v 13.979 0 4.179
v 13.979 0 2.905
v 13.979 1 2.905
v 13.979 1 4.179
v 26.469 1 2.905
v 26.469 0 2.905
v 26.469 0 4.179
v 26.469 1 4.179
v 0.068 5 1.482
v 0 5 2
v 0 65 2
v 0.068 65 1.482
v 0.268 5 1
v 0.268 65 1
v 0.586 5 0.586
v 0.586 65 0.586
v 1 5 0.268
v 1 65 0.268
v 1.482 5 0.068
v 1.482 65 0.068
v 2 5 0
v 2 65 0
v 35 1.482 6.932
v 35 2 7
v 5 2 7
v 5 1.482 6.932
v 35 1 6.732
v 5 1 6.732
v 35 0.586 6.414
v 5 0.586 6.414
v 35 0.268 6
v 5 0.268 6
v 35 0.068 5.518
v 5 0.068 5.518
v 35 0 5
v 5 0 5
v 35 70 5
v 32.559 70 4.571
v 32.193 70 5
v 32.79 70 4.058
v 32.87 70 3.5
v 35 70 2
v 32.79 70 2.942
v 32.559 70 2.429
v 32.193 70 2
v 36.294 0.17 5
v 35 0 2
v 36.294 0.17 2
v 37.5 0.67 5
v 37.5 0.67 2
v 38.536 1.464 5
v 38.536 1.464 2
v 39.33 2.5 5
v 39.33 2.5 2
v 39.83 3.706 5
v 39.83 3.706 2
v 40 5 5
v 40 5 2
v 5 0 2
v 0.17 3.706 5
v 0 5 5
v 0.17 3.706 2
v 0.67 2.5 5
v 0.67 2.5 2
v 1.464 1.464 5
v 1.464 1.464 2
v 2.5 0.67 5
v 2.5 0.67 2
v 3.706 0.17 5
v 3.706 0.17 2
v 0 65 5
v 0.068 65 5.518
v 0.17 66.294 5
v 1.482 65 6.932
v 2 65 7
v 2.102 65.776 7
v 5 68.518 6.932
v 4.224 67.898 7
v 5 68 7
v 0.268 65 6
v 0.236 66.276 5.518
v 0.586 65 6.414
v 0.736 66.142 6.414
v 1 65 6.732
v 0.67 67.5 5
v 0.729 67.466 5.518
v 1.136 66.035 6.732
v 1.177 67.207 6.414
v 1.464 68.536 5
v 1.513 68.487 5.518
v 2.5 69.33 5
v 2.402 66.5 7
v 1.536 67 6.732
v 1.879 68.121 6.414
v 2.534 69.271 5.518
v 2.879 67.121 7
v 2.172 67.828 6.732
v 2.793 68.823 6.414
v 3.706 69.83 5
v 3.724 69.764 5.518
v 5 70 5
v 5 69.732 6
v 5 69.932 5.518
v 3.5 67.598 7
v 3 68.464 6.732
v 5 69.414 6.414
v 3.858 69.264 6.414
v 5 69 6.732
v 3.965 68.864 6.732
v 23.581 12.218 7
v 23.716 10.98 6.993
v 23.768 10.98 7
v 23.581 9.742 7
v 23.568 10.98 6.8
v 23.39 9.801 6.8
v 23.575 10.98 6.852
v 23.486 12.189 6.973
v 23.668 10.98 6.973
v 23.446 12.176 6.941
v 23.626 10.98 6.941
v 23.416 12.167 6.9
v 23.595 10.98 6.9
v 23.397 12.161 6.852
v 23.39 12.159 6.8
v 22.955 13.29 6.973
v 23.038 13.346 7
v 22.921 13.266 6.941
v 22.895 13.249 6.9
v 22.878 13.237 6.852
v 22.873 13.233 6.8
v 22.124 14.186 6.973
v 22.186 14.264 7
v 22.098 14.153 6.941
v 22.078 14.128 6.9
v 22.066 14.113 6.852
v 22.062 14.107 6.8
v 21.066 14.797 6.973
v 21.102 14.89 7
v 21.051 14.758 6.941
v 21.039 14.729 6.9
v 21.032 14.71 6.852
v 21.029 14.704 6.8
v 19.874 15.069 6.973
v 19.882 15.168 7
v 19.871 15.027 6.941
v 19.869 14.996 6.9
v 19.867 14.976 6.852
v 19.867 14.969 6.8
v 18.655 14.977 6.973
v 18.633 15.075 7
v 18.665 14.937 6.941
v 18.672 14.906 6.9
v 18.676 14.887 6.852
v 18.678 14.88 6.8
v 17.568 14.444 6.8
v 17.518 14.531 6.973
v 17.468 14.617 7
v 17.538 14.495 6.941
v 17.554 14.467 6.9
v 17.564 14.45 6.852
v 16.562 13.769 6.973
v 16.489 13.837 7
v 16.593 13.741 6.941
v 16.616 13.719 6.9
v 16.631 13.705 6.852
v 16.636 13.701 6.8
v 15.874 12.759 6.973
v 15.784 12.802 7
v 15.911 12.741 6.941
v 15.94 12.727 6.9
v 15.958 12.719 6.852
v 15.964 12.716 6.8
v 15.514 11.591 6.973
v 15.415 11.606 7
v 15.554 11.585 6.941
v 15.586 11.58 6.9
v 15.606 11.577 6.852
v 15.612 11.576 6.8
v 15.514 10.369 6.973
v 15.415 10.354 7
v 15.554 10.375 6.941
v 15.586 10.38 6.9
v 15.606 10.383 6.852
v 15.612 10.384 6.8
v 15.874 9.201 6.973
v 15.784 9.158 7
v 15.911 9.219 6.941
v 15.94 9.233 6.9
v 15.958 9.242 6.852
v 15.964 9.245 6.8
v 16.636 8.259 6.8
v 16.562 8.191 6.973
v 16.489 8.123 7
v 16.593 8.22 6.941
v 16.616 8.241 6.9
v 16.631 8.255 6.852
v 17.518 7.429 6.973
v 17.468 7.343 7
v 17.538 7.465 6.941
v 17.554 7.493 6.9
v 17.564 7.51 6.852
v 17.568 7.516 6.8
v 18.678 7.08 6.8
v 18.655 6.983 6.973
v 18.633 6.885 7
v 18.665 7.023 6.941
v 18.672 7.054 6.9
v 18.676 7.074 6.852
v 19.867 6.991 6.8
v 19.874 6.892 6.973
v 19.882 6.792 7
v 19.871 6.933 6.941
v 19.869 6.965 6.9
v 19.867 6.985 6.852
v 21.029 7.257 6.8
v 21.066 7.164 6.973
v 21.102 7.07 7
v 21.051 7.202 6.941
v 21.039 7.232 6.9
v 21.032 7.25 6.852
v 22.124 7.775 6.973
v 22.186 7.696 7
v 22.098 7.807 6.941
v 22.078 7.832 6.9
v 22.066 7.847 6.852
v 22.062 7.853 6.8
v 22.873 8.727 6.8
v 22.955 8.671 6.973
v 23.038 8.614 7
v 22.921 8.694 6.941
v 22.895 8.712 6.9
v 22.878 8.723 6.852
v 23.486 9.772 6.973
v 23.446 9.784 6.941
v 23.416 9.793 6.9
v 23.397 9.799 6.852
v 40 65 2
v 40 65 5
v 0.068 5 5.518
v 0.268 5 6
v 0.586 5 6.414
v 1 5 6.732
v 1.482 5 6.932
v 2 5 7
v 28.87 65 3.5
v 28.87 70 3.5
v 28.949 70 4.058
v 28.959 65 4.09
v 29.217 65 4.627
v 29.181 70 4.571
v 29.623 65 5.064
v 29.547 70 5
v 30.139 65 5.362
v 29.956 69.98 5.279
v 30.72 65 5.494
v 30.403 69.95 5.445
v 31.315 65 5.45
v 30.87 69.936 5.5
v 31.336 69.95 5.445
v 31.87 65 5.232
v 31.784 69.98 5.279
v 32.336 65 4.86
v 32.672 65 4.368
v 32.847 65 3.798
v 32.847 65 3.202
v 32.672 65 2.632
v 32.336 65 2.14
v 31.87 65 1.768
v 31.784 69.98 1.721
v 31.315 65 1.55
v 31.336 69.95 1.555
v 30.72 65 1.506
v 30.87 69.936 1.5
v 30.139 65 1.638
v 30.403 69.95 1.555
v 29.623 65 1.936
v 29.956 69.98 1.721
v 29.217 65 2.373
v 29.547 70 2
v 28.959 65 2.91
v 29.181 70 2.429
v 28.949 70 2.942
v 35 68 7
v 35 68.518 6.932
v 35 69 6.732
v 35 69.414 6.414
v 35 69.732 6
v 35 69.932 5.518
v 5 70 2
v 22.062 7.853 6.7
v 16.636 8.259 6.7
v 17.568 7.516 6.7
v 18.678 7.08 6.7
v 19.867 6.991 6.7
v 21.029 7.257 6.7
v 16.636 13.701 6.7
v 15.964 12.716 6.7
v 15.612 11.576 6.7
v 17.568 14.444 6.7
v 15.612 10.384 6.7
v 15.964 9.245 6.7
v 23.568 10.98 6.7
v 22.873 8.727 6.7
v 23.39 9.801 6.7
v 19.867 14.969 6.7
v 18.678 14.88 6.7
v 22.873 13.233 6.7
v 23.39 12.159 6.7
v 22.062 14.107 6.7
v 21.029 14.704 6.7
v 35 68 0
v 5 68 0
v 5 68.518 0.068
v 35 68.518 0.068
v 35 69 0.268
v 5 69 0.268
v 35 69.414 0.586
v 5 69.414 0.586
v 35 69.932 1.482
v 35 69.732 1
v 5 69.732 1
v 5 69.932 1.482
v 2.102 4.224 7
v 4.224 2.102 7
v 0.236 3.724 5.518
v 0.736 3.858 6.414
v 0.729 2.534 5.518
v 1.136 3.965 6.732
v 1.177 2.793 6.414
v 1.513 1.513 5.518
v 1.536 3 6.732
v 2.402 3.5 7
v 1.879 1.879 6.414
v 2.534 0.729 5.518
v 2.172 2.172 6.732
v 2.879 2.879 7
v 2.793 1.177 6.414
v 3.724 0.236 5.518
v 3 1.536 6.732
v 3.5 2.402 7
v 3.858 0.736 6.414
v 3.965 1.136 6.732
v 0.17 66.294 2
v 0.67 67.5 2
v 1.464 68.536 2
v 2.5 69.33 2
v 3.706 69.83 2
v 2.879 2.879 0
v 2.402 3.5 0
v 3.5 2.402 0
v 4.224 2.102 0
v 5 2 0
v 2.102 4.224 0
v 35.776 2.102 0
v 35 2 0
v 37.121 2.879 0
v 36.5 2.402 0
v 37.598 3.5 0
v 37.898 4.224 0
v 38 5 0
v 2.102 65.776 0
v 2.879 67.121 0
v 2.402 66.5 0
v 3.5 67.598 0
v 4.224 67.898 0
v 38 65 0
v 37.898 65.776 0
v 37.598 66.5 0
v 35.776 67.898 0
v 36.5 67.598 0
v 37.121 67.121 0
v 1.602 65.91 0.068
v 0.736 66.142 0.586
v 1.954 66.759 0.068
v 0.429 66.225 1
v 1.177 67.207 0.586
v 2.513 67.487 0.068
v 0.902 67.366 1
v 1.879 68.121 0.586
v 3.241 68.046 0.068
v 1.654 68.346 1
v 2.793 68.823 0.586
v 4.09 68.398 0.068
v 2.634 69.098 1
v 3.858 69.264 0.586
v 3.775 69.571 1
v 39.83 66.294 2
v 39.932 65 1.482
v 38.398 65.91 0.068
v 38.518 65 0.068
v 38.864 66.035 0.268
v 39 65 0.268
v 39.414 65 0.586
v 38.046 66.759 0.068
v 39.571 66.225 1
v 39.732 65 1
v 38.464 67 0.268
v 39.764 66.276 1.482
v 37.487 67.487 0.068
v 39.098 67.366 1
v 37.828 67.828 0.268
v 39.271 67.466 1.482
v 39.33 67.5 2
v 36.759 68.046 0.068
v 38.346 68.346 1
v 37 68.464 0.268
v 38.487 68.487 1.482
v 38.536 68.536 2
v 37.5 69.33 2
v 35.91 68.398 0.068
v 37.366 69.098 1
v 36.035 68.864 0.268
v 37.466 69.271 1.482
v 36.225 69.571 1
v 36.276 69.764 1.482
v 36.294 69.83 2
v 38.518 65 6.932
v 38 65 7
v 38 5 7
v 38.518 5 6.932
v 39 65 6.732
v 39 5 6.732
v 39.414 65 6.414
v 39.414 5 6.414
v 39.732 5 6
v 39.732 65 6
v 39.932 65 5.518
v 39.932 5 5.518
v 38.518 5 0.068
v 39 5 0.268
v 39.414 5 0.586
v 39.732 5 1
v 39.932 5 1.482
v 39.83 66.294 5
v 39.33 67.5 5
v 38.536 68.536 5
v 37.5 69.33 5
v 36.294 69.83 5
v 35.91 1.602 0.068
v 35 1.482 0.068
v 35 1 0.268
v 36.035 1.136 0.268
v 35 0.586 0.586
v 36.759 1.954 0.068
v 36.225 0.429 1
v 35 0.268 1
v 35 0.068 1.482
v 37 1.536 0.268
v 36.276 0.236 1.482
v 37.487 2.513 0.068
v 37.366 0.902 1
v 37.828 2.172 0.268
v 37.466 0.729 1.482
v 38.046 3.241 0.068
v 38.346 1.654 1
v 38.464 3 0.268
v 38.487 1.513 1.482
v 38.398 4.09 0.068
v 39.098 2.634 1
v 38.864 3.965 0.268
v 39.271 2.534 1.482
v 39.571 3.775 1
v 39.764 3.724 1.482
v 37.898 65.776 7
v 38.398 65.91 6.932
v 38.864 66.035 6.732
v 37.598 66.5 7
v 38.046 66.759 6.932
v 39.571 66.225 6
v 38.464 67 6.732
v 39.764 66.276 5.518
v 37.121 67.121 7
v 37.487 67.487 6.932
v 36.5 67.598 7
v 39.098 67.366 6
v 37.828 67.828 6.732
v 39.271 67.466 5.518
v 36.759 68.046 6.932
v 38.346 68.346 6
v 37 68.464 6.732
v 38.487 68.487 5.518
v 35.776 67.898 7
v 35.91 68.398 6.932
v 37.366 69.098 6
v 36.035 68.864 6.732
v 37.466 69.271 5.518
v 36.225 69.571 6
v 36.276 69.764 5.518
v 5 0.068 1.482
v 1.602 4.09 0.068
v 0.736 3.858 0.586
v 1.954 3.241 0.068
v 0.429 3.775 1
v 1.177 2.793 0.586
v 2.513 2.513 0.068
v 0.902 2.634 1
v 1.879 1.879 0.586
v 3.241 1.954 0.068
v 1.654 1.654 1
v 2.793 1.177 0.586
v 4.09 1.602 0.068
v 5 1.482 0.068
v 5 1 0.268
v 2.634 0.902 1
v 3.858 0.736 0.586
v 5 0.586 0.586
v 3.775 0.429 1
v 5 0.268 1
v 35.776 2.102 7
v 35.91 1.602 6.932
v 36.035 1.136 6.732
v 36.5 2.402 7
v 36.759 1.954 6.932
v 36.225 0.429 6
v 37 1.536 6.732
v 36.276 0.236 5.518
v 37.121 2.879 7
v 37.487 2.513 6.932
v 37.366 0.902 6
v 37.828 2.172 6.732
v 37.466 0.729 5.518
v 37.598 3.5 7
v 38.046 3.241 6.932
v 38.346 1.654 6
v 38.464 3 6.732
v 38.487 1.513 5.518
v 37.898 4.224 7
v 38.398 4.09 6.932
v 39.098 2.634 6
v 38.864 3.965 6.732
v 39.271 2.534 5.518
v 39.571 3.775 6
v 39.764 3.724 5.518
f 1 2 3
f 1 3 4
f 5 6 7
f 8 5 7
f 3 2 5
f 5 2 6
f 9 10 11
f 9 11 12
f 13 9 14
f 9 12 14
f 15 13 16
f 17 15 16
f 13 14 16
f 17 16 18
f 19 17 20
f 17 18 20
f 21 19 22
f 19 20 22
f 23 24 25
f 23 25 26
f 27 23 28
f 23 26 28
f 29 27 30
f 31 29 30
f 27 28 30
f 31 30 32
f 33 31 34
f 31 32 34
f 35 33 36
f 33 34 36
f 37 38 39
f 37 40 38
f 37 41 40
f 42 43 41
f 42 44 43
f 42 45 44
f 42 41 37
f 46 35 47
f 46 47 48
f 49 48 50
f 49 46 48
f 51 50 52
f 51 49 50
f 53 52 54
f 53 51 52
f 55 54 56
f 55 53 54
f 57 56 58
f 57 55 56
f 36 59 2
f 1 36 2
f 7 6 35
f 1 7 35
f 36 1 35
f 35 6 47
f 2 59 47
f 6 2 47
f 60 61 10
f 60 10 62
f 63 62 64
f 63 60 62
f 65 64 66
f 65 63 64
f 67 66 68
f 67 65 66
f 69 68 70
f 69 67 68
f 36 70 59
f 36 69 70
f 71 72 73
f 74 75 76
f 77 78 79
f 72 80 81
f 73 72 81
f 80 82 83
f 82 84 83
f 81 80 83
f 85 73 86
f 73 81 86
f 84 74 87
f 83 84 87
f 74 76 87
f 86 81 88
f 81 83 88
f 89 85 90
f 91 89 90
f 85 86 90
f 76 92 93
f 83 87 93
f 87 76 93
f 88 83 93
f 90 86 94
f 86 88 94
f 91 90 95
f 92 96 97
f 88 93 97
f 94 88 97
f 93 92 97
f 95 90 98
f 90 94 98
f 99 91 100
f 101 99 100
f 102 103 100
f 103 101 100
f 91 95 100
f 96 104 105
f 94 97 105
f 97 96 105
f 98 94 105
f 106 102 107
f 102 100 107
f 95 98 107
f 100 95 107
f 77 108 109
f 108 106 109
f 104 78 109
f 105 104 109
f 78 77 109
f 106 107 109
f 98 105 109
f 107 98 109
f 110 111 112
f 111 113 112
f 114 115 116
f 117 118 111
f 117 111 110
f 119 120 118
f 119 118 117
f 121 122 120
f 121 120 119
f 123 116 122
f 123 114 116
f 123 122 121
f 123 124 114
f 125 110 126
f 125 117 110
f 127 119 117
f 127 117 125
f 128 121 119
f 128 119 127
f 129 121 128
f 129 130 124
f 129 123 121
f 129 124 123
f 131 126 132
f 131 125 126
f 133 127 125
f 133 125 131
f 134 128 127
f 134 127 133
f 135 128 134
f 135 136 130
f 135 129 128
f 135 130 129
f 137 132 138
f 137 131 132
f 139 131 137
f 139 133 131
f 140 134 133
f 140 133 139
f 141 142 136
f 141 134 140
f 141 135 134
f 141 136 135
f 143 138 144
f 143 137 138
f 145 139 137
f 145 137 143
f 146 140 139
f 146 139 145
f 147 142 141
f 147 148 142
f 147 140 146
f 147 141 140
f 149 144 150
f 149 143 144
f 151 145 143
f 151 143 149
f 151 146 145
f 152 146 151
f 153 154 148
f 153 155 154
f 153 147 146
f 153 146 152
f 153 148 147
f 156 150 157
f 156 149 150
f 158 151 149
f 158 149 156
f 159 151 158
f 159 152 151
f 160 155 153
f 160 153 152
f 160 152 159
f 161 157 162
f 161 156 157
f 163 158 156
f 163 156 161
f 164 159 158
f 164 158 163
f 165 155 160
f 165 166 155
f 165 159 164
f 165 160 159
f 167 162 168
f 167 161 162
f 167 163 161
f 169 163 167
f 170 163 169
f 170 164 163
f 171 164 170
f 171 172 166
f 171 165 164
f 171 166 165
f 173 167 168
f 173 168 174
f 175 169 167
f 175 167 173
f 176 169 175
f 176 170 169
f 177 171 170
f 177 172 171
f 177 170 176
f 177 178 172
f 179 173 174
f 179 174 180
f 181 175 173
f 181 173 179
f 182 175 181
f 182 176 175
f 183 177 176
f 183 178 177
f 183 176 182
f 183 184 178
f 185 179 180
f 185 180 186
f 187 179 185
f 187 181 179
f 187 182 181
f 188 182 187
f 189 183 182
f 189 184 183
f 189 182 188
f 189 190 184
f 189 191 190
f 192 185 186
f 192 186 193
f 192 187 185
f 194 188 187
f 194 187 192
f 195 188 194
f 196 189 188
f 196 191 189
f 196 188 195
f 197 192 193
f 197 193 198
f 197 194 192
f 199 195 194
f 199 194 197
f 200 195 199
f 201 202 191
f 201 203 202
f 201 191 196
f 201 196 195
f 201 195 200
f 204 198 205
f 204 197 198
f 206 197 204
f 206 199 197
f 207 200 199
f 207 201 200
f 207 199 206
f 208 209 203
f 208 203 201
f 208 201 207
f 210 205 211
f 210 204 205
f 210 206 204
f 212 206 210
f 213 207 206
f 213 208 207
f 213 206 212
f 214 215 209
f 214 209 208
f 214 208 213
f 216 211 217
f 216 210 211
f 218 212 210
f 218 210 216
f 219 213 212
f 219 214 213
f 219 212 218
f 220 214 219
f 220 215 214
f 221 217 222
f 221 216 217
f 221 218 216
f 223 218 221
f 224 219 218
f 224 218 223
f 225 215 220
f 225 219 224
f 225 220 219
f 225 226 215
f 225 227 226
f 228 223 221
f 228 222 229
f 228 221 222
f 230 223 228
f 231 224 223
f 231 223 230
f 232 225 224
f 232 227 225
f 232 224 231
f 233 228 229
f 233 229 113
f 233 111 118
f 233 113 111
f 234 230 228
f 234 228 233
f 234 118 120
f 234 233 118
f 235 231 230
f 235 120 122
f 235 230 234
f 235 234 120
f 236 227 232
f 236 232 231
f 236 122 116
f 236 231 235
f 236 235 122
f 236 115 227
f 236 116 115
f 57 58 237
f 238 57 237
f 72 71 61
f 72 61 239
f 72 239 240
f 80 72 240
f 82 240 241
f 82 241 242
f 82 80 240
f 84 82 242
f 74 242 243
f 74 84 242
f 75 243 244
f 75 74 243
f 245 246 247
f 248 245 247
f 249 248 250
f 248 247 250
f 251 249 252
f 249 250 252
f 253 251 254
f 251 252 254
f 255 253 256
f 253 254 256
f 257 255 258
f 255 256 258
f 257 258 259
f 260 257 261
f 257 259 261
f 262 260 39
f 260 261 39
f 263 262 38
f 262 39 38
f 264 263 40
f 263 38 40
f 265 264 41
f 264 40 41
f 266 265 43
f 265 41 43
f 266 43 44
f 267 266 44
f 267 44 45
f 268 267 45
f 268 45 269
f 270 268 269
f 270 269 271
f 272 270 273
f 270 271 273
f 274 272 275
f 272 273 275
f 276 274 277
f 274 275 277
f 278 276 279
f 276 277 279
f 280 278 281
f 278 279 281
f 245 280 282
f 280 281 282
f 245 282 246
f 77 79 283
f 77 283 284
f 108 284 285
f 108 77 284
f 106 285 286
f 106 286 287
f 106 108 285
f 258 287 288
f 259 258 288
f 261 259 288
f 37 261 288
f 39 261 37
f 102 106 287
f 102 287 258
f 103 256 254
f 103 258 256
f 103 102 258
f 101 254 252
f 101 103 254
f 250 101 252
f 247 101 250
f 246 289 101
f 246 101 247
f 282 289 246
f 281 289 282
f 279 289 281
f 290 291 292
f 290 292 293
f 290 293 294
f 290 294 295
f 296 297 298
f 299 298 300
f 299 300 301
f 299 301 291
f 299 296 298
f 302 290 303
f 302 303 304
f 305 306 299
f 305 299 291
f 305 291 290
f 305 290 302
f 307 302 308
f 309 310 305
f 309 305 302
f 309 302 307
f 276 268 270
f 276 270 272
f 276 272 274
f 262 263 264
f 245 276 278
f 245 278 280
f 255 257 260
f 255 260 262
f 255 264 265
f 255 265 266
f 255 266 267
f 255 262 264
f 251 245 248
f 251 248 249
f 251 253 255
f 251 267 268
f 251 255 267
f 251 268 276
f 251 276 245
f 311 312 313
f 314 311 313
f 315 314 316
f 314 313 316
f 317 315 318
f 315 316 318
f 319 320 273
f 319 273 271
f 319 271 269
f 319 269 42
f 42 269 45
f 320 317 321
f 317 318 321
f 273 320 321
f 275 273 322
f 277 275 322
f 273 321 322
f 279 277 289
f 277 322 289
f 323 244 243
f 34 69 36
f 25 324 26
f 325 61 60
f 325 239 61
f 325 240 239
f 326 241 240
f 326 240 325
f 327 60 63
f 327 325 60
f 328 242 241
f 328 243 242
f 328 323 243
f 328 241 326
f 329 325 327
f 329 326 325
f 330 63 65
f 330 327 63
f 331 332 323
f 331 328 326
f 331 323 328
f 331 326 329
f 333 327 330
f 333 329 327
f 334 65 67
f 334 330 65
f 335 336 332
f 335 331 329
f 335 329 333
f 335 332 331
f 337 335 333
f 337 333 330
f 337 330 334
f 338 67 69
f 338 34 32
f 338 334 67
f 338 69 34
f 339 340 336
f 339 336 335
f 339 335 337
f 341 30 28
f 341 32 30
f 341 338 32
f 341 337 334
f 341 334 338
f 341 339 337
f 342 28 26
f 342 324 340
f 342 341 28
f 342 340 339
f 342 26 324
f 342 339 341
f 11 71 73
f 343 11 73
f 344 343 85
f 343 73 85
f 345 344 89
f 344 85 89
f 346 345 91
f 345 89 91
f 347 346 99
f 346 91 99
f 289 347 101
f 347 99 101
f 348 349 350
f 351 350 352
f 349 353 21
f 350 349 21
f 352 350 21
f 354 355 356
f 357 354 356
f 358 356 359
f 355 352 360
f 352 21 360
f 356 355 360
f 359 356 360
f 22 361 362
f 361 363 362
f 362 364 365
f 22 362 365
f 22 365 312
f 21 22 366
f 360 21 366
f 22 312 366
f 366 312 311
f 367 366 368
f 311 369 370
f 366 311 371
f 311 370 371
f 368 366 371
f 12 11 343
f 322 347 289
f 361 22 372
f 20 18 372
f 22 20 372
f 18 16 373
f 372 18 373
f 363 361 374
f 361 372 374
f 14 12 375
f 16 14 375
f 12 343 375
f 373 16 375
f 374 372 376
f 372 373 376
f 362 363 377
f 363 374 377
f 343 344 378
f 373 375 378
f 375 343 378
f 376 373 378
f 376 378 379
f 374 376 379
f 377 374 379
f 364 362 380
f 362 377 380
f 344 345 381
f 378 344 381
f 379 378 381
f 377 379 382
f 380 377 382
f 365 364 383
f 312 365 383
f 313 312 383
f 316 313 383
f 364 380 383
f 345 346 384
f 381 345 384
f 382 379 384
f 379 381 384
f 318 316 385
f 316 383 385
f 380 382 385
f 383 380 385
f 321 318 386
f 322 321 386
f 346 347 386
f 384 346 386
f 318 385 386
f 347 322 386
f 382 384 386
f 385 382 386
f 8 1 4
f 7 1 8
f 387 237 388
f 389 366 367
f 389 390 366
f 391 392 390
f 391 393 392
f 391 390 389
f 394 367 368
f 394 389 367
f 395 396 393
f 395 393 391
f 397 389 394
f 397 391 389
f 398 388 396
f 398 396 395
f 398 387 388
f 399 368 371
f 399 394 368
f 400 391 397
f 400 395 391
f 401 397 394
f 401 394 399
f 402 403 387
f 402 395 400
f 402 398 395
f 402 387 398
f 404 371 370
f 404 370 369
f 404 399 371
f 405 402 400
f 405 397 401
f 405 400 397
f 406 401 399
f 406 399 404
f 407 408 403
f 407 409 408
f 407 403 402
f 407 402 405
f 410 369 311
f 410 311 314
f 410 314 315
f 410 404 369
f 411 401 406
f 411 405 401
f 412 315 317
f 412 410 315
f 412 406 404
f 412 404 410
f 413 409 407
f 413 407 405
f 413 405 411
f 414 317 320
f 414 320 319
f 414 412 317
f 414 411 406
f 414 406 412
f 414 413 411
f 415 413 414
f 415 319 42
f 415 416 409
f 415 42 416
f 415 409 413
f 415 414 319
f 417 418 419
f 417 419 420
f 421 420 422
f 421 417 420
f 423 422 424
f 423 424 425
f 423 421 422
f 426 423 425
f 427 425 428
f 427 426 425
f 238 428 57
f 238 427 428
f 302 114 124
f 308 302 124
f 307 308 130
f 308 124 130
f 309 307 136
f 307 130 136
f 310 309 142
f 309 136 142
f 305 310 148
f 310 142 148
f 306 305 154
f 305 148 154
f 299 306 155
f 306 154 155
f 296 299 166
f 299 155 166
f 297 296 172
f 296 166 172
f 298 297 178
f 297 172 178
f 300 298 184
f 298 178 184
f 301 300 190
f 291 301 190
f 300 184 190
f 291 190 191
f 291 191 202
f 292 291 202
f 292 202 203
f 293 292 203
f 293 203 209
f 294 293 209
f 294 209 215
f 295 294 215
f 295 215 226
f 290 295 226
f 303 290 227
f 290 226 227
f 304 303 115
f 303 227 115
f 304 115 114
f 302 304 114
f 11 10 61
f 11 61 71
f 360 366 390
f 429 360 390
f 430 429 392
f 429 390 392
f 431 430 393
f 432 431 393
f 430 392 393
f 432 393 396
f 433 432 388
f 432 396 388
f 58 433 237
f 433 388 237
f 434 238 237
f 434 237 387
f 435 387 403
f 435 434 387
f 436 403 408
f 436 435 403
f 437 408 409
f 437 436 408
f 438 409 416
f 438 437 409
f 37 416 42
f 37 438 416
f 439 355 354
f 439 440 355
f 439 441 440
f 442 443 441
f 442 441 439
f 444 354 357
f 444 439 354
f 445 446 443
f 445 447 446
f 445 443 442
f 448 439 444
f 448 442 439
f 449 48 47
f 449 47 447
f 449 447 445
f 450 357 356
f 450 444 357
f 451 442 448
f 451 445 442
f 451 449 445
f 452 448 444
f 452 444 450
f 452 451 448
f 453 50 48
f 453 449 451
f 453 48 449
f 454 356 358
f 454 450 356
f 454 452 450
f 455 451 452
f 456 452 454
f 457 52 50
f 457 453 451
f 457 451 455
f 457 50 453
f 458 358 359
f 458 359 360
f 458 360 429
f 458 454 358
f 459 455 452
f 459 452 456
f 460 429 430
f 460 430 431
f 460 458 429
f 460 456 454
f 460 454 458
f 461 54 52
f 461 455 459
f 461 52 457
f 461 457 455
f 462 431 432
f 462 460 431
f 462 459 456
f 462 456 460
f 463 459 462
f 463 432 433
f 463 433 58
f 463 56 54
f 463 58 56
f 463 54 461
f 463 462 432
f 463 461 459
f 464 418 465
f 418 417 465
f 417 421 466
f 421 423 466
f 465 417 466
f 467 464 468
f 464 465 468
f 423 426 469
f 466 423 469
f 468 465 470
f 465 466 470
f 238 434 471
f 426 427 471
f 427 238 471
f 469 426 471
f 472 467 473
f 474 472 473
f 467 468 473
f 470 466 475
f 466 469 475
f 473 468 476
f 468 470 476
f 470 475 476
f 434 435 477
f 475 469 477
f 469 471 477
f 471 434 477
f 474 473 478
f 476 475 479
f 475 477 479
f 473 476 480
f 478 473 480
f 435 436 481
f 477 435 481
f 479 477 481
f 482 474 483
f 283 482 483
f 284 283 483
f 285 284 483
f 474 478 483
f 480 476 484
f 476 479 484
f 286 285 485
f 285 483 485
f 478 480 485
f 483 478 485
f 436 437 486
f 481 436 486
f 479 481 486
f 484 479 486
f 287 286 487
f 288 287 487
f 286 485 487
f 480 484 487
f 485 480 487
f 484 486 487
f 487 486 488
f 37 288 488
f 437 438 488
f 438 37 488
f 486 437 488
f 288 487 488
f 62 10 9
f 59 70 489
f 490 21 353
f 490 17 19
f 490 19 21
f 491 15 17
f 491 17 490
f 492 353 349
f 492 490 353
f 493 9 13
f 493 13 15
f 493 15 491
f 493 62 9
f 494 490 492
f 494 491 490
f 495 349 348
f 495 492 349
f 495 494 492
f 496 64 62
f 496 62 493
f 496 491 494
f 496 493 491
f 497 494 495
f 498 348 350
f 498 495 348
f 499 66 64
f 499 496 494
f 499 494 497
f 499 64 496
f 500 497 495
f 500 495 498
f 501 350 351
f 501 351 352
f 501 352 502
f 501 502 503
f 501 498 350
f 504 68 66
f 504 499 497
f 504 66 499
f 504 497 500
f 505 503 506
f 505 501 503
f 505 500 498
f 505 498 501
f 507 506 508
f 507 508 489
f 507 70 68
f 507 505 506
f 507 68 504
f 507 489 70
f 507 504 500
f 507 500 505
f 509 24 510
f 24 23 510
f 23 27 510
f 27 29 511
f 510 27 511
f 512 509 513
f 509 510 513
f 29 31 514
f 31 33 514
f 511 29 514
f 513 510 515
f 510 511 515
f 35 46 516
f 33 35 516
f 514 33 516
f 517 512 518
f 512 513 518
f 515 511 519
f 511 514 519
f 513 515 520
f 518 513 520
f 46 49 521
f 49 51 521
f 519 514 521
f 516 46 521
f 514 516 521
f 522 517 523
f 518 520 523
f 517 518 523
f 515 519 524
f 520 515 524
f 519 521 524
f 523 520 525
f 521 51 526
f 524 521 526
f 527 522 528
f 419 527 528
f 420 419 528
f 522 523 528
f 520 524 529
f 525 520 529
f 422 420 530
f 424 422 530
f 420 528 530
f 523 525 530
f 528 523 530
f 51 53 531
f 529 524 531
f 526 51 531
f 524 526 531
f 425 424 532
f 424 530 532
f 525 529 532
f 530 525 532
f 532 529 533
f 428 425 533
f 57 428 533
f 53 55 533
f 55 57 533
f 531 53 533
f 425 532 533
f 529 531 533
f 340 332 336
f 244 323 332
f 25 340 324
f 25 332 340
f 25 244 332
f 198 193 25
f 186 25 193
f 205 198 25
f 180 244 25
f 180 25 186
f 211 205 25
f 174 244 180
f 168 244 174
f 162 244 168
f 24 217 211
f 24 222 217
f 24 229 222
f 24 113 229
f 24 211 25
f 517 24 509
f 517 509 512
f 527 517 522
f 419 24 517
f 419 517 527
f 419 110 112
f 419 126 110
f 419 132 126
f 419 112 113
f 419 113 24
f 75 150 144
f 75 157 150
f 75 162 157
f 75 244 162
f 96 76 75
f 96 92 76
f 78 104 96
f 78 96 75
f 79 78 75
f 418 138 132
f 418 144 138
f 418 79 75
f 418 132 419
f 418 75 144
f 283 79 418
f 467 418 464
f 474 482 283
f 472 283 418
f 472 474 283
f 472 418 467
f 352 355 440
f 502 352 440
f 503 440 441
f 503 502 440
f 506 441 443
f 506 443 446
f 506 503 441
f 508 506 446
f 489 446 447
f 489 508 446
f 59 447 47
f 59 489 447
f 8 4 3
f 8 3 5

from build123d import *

# Parameters (mm, degrees)
F0_W         = 40
F0_H         = 70
F1_DEPTH     = 7
F2_R         = 5
F3_R         = 2
F4_DEPTH     = 5
F5_T1_DEPTH  = 60
F5_T3_DEPTH  = 30
F5_T6_ANGLE  = 90
F5_T8_ANGLE  = 90
F5_T10_ANGLE = 90
F5_T12_ANGLE = 90
F5_T14_ANGLE = 90
F5_T16_ANGLE = 90
F5_T18_ANGLE = 90
F5_T20_ANGLE = 90
F6_R         = 4
F7_DEPTH     = 0.3
F8_R         = 0.2
F9_W         = 12.4906748533
F9_H         = 1.2735207565
F10_DEPTH    = 1


# Not quite as in the source:
# - a fillet or chamfer that OpenCascade refuses, or shapes differently, is made with other operations: its cross-section is extruded or revolved along the edge and cut away or added


with BuildPart() as f1:
    # F0 (on Top) → F1 (new body)
    with BuildSketch(Plane.XY):
        with Locations((20, 35)):
            Rectangle(F0_W, F0_H)
    extrude(amount=F1_DEPTH)

    # F2
    f2_edges = [f1.edges().sort_by_distance(p)[0] for p in [
        (40, 0, 3.5),
        (0, 0, 3.5),
        (40, 70, 3.5),
        (0, 70, 3.5),
    ]]
    fillet(f2_edges, radius=F2_R)

    # F3 (on face) → F4 (cut)
    with BuildSketch(Plane(origin=(0, 70, 0), x_dir=(-1, 0, 0), z_dir=(0, 1, 0))):
        with Locations((-30.8697689325, 3.5)):
            Circle(F3_R)
    extrude(amount=-F4_DEPTH, mode=Mode.SUBTRACT)

    # F5: fillet of radius 2 on 16 edges, made by hand

    # F5_s2 → F5_t1 (cut)
    with BuildSketch(Plane.XZ.offset(-65)):
        with BuildLine():
            ThreePointArc((0, 5), (0.5857864376, 6.4142135624), (2, 7))
            Line((2, 7), (0, 7))
            Line((0, 7), (0, 5))
        make_face()
        with BuildLine():
            ThreePointArc((38, 7), (39.4142135624, 6.4142135624), (40, 5))
            Line((40, 5), (40, 7))
            Line((40, 7), (38, 7))
        make_face()
        with BuildLine():
            ThreePointArc((0, 2), (0.5857864376, 0.5857864376), (2, 0))
            Line((2, 0), (0, 0))
            Line((0, 0), (0, 2))
        make_face()
        with BuildLine():
            ThreePointArc((38, 0), (39.4142135624, 0.5857864376), (40, 2))
            Line((40, 2), (40, 0))
            Line((40, 0), (38, 0))
        make_face()
    extrude(amount=F5_T1_DEPTH, mode=Mode.SUBTRACT)

    # F5_s4 → F5_t3 (cut)
    with BuildSketch(Plane.YZ.offset(5)):
        with BuildLine():
            ThreePointArc((68, 7), (69.4142135624, 6.4142135624), (70, 5))
            Line((70, 5), (70, 7))
            Line((70, 7), (68, 7))
        make_face()
        with BuildLine():
            ThreePointArc((2, 7), (0.5857864376, 6.4142135624), (0, 5))
            Line((0, 5), (0, 7))
            Line((0, 7), (2, 7))
        make_face()
        with BuildLine():
            ThreePointArc((68, 0), (69.4142135624, 0.5857864376), (70, 2))
            Line((70, 2), (70, 0))
            Line((70, 0), (68, 0))
        make_face()
        with BuildLine():
            ThreePointArc((2, 0), (0.5857864376, 0.5857864376), (0, 2))
            Line((0, 2), (0, 0))
            Line((0, 0), (2, 0))
        make_face()
    extrude(amount=F5_T3_DEPTH, mode=Mode.SUBTRACT)

    # F5_s5 → F5_t6 (revolve, cut)
    with BuildSketch(Plane.XZ.offset(-65)):
        with BuildLine():
            ThreePointArc((0, 5), (0.5857864376, 6.4142135624), (2, 7))
            Line((2, 7), (0, 7))
            Line((0, 7), (0, 5))
        make_face()
    revolve(axis=Axis((5, 65, 7), (0, 0, -1)), revolution_arc=F5_T6_ANGLE, mode=Mode.SUBTRACT)

    # F5_s7 → F5_t8 (revolve, cut)
    with BuildSketch(Plane.XZ.offset(-5)):
        with BuildLine():
            ThreePointArc((0, 5), (0.5857864376, 6.4142135624), (2, 7))
            Line((2, 7), (0, 7))
            Line((0, 7), (0, 5))
        make_face()
    revolve(axis=Axis((5, 5, 7), (0, 0, 1)), revolution_arc=F5_T8_ANGLE, mode=Mode.SUBTRACT)

    # F5_s9 → F5_t10 (revolve, cut)
    with BuildSketch(Plane.XZ.offset(-65)):
        with BuildLine():
            ThreePointArc((38, 7), (39.4142135624, 6.4142135624), (40, 5))
            Line((40, 5), (40, 7))
            Line((40, 7), (38, 7))
        make_face()
    revolve(axis=Axis((35, 65, 7), (0, 0, 1)), revolution_arc=F5_T10_ANGLE, mode=Mode.SUBTRACT)

    # F5_s11 → F5_t12 (revolve, cut)
    with BuildSketch(Plane.YZ.offset(35)):
        with BuildLine():
            ThreePointArc((2, 7), (0.5857864376, 6.4142135624), (0, 5))
            Line((0, 5), (0, 7))
            Line((0, 7), (2, 7))
        make_face()
    revolve(axis=Axis((35, 5, 7), (0, 0, 1)), revolution_arc=F5_T12_ANGLE, mode=Mode.SUBTRACT)

    # F5_s13 → F5_t14 (revolve, cut)
    with BuildSketch(Plane.XZ.offset(-65)):
        with BuildLine():
            ThreePointArc((2, 0), (0.5857864376, 0.5857864376), (0, 2))
            Line((0, 2), (0, 0))
            Line((0, 0), (2, 0))
        make_face()
    revolve(axis=Axis((5, 65, 0), (0, 0, -1)), revolution_arc=F5_T14_ANGLE, mode=Mode.SUBTRACT)

    # F5_s15 → F5_t16 (revolve, cut)
    with BuildSketch(Plane.XZ.offset(-5)):
        with BuildLine():
            ThreePointArc((2, 0), (0.5857864376, 0.5857864376), (0, 2))
            Line((0, 2), (0, 0))
            Line((0, 0), (2, 0))
        make_face()
    revolve(axis=Axis((5, 5, 0), (0, 0, 1)), revolution_arc=F5_T16_ANGLE, mode=Mode.SUBTRACT)

    # F5_s17 → F5_t18 (revolve, cut)
    with BuildSketch(Plane.XZ.offset(-65)):
        with BuildLine():
            ThreePointArc((38, 0), (39.4142135624, 0.5857864376), (40, 2))
            Line((40, 2), (40, 0))
            Line((40, 0), (38, 0))
        make_face()
    revolve(axis=Axis((35, 65, 0), (0, 0, 1)), revolution_arc=F5_T18_ANGLE, mode=Mode.SUBTRACT)

    # F5_s19 → F5_t20 (revolve, cut)
    with BuildSketch(Plane.YZ.offset(35)):
        with BuildLine():
            ThreePointArc((2, 0), (0.5857864376, 0.5857864376), (0, 2))
            Line((0, 2), (0, 0))
            Line((0, 0), (2, 0))
        make_face()
    revolve(axis=Axis((35, 5, 0), (0, 0, 1)), revolution_arc=F5_T20_ANGLE, mode=Mode.SUBTRACT)

    # F6 (on face) → F7 (cut)
    with BuildSketch(Plane.XY.offset(7)):
        with Locations((19.5677466691, 10.9801534563)):
            Circle(F6_R)
    extrude(amount=-F7_DEPTH, mode=Mode.SUBTRACT)

    # F8
    f8_edges = [f1.edges().sort_by_distance(p)[0] for p in [
        (15.567747, 10.980153, 7),
        (2.87868, 67.12132, 7),
        (2, 35, 7),
        (20, 68, 7),
        (2.87868, 2.87868, 7),
        (37.12132, 67.12132, 7),
        (20, 2, 7),
        (38, 35, 7),
        (37.12132, 2.87868, 7),
    ]]
    fillet(f8_edges, radius=F8_R)

    # F9 (on face) → F10 (cut)
    with BuildSketch(Plane.XZ):
        with Locations((20.2241037041, 3.5419908818)):
            Rectangle(F9_W, F9_H)
    extrude(amount=-F10_DEPTH, mode=Mode.SUBTRACT)


solid = f1.part
